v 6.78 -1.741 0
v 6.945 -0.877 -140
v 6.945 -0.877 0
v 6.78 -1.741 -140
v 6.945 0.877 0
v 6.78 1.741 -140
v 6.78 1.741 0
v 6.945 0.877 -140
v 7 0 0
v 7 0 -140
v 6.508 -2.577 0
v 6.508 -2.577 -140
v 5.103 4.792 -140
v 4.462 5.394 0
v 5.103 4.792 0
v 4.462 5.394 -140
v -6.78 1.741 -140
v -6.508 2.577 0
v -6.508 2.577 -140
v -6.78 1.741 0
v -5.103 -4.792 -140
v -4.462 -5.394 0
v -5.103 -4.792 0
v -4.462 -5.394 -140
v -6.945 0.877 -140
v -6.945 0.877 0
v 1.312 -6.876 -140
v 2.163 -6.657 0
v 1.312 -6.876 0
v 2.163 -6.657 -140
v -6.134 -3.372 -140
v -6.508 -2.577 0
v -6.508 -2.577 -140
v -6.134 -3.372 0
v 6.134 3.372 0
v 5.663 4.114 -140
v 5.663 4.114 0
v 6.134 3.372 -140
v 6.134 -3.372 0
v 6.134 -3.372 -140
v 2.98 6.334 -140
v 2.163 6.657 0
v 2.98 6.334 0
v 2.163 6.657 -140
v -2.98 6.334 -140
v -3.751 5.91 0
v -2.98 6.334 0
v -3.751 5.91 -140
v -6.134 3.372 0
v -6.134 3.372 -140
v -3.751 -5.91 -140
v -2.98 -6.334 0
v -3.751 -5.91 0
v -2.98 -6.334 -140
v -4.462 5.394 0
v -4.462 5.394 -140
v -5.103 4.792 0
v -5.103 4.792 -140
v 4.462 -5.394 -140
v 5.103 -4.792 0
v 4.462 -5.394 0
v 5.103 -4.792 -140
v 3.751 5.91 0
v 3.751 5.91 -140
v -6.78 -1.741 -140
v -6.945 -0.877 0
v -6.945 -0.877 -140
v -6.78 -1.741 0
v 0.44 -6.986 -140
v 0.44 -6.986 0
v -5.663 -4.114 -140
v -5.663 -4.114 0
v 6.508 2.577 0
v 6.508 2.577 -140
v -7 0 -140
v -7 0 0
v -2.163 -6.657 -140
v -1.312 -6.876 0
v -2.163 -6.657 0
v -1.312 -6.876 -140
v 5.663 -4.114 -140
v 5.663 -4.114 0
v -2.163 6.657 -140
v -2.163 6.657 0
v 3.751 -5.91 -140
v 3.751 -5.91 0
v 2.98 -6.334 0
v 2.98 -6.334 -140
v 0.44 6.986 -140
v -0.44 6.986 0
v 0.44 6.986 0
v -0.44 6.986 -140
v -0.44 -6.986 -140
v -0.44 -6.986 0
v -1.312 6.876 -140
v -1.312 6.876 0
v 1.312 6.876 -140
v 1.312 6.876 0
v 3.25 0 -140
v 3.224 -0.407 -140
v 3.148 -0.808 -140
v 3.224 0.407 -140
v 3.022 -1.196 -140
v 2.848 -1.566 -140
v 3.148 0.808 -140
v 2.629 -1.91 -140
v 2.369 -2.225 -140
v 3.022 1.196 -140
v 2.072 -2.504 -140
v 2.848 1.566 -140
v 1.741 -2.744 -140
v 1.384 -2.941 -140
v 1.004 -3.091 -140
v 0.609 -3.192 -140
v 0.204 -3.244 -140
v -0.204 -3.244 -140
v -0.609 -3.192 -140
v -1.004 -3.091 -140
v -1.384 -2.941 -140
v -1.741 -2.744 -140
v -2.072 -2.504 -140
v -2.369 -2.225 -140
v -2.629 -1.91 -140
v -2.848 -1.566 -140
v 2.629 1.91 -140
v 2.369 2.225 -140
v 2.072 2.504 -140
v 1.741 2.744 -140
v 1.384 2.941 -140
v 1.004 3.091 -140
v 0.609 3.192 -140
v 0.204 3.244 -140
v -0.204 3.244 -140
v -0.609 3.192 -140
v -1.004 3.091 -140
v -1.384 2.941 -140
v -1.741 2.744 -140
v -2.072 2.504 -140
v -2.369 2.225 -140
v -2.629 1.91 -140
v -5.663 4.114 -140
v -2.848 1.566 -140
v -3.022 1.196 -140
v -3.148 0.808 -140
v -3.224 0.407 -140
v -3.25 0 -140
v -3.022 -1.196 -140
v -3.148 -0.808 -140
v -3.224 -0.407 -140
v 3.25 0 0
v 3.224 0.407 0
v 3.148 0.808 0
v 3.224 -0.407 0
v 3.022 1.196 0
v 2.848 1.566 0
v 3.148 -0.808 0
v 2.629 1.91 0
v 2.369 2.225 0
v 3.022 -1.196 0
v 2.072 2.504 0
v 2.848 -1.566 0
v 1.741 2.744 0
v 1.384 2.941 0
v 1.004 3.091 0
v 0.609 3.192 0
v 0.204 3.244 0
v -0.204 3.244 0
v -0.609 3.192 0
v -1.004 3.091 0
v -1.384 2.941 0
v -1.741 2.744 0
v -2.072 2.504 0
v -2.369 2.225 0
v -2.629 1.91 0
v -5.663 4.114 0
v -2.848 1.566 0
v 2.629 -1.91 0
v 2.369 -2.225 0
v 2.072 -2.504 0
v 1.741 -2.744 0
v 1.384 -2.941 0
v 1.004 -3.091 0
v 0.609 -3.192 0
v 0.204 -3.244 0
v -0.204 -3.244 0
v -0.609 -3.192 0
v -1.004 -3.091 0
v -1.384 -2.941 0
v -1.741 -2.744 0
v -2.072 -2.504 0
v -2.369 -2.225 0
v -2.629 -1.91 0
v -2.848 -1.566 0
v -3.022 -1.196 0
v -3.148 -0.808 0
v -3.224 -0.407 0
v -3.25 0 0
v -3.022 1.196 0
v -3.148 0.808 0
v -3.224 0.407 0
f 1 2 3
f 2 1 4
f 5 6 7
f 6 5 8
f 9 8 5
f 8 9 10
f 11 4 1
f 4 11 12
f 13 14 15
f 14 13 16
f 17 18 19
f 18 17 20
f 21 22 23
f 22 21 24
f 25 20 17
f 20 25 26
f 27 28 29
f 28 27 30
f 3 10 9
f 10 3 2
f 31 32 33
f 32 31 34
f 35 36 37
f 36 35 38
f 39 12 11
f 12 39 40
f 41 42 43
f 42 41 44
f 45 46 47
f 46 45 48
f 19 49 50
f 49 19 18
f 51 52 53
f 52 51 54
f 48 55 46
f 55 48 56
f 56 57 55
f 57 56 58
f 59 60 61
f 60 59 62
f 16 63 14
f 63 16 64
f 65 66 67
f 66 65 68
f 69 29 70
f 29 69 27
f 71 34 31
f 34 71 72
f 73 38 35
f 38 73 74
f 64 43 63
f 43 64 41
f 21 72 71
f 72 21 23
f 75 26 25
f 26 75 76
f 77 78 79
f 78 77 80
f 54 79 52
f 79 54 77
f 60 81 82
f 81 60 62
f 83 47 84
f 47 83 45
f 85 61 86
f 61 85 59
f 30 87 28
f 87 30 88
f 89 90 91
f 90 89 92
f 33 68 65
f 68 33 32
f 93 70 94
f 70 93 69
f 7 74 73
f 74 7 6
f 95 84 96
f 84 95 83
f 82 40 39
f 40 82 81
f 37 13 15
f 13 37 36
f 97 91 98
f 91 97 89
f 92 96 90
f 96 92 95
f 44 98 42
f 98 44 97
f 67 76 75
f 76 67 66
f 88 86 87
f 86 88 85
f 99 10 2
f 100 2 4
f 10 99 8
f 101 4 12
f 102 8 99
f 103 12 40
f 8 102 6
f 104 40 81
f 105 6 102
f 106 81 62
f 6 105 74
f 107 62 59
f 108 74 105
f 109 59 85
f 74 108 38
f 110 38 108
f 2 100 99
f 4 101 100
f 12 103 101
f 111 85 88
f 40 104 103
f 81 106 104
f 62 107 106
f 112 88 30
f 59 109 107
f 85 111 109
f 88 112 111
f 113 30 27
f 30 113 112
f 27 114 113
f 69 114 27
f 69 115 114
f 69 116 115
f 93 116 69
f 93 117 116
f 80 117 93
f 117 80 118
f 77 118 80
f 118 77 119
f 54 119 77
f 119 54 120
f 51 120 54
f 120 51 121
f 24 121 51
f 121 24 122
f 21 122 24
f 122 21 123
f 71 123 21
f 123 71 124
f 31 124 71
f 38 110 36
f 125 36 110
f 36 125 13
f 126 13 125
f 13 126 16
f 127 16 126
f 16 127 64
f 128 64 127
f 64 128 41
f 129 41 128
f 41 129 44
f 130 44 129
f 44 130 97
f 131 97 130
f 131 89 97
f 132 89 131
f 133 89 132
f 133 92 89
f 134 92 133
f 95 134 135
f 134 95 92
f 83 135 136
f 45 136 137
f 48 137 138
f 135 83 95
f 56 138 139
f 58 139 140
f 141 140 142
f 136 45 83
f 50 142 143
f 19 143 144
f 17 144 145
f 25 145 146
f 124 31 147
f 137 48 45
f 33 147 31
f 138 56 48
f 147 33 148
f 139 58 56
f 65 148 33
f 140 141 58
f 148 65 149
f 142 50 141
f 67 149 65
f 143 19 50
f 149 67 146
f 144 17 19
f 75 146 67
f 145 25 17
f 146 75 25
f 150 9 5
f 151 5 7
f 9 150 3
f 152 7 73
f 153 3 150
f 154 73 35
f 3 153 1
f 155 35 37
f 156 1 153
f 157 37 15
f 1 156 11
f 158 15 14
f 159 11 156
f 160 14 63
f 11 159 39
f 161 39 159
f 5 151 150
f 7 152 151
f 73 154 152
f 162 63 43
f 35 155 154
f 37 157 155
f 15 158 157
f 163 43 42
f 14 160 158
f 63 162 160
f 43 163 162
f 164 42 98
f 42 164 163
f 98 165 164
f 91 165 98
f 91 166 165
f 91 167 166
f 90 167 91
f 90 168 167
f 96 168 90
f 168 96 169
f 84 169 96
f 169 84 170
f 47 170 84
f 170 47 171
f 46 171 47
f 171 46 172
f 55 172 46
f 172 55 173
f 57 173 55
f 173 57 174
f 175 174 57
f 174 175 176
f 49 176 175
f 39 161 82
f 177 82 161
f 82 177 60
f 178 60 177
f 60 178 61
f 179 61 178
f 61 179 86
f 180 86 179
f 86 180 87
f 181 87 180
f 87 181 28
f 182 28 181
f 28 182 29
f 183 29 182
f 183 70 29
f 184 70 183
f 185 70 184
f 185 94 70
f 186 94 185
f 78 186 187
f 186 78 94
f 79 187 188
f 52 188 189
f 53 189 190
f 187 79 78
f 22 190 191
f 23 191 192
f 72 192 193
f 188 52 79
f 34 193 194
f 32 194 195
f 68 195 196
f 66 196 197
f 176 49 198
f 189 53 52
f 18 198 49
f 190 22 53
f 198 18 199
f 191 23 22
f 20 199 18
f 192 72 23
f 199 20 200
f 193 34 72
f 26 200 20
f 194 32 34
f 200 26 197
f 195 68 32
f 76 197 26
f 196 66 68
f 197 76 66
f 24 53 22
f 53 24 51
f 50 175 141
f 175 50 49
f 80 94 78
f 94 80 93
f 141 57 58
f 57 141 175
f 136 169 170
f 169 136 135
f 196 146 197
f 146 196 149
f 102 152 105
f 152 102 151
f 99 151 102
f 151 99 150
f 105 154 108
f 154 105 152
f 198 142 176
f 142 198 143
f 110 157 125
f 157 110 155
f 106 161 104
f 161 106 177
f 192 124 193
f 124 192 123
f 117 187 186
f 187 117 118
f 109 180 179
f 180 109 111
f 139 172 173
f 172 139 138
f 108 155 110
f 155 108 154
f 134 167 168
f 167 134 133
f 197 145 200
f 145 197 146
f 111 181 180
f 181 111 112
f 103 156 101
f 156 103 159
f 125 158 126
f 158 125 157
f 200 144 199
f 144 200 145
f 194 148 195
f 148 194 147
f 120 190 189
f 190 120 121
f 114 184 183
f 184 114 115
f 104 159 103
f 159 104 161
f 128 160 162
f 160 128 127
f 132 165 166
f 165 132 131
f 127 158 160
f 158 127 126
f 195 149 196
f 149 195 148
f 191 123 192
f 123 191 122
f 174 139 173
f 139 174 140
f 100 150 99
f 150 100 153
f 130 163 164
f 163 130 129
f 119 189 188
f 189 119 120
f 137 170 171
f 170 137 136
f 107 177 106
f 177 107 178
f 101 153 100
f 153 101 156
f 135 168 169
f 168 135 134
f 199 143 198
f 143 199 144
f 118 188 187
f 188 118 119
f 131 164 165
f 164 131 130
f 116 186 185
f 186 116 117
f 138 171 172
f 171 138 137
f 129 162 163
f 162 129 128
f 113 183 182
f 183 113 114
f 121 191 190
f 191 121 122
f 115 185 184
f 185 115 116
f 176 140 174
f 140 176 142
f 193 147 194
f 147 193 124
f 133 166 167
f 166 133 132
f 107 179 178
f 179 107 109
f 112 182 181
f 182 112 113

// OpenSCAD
$fn = 50;


difference() {
	union() {
		translate(v = [0, 0, -140.0000000000]) {
			cylinder(h = 140, r = 7.0000000000);
		}
		cylinder(h = 0, r = 13.0000000000);
	}
	union() {
		#translate(v = [0, 0, -140]) {
			cylinder(h = 140, r = 3.2500000000);
		}
	}
}
